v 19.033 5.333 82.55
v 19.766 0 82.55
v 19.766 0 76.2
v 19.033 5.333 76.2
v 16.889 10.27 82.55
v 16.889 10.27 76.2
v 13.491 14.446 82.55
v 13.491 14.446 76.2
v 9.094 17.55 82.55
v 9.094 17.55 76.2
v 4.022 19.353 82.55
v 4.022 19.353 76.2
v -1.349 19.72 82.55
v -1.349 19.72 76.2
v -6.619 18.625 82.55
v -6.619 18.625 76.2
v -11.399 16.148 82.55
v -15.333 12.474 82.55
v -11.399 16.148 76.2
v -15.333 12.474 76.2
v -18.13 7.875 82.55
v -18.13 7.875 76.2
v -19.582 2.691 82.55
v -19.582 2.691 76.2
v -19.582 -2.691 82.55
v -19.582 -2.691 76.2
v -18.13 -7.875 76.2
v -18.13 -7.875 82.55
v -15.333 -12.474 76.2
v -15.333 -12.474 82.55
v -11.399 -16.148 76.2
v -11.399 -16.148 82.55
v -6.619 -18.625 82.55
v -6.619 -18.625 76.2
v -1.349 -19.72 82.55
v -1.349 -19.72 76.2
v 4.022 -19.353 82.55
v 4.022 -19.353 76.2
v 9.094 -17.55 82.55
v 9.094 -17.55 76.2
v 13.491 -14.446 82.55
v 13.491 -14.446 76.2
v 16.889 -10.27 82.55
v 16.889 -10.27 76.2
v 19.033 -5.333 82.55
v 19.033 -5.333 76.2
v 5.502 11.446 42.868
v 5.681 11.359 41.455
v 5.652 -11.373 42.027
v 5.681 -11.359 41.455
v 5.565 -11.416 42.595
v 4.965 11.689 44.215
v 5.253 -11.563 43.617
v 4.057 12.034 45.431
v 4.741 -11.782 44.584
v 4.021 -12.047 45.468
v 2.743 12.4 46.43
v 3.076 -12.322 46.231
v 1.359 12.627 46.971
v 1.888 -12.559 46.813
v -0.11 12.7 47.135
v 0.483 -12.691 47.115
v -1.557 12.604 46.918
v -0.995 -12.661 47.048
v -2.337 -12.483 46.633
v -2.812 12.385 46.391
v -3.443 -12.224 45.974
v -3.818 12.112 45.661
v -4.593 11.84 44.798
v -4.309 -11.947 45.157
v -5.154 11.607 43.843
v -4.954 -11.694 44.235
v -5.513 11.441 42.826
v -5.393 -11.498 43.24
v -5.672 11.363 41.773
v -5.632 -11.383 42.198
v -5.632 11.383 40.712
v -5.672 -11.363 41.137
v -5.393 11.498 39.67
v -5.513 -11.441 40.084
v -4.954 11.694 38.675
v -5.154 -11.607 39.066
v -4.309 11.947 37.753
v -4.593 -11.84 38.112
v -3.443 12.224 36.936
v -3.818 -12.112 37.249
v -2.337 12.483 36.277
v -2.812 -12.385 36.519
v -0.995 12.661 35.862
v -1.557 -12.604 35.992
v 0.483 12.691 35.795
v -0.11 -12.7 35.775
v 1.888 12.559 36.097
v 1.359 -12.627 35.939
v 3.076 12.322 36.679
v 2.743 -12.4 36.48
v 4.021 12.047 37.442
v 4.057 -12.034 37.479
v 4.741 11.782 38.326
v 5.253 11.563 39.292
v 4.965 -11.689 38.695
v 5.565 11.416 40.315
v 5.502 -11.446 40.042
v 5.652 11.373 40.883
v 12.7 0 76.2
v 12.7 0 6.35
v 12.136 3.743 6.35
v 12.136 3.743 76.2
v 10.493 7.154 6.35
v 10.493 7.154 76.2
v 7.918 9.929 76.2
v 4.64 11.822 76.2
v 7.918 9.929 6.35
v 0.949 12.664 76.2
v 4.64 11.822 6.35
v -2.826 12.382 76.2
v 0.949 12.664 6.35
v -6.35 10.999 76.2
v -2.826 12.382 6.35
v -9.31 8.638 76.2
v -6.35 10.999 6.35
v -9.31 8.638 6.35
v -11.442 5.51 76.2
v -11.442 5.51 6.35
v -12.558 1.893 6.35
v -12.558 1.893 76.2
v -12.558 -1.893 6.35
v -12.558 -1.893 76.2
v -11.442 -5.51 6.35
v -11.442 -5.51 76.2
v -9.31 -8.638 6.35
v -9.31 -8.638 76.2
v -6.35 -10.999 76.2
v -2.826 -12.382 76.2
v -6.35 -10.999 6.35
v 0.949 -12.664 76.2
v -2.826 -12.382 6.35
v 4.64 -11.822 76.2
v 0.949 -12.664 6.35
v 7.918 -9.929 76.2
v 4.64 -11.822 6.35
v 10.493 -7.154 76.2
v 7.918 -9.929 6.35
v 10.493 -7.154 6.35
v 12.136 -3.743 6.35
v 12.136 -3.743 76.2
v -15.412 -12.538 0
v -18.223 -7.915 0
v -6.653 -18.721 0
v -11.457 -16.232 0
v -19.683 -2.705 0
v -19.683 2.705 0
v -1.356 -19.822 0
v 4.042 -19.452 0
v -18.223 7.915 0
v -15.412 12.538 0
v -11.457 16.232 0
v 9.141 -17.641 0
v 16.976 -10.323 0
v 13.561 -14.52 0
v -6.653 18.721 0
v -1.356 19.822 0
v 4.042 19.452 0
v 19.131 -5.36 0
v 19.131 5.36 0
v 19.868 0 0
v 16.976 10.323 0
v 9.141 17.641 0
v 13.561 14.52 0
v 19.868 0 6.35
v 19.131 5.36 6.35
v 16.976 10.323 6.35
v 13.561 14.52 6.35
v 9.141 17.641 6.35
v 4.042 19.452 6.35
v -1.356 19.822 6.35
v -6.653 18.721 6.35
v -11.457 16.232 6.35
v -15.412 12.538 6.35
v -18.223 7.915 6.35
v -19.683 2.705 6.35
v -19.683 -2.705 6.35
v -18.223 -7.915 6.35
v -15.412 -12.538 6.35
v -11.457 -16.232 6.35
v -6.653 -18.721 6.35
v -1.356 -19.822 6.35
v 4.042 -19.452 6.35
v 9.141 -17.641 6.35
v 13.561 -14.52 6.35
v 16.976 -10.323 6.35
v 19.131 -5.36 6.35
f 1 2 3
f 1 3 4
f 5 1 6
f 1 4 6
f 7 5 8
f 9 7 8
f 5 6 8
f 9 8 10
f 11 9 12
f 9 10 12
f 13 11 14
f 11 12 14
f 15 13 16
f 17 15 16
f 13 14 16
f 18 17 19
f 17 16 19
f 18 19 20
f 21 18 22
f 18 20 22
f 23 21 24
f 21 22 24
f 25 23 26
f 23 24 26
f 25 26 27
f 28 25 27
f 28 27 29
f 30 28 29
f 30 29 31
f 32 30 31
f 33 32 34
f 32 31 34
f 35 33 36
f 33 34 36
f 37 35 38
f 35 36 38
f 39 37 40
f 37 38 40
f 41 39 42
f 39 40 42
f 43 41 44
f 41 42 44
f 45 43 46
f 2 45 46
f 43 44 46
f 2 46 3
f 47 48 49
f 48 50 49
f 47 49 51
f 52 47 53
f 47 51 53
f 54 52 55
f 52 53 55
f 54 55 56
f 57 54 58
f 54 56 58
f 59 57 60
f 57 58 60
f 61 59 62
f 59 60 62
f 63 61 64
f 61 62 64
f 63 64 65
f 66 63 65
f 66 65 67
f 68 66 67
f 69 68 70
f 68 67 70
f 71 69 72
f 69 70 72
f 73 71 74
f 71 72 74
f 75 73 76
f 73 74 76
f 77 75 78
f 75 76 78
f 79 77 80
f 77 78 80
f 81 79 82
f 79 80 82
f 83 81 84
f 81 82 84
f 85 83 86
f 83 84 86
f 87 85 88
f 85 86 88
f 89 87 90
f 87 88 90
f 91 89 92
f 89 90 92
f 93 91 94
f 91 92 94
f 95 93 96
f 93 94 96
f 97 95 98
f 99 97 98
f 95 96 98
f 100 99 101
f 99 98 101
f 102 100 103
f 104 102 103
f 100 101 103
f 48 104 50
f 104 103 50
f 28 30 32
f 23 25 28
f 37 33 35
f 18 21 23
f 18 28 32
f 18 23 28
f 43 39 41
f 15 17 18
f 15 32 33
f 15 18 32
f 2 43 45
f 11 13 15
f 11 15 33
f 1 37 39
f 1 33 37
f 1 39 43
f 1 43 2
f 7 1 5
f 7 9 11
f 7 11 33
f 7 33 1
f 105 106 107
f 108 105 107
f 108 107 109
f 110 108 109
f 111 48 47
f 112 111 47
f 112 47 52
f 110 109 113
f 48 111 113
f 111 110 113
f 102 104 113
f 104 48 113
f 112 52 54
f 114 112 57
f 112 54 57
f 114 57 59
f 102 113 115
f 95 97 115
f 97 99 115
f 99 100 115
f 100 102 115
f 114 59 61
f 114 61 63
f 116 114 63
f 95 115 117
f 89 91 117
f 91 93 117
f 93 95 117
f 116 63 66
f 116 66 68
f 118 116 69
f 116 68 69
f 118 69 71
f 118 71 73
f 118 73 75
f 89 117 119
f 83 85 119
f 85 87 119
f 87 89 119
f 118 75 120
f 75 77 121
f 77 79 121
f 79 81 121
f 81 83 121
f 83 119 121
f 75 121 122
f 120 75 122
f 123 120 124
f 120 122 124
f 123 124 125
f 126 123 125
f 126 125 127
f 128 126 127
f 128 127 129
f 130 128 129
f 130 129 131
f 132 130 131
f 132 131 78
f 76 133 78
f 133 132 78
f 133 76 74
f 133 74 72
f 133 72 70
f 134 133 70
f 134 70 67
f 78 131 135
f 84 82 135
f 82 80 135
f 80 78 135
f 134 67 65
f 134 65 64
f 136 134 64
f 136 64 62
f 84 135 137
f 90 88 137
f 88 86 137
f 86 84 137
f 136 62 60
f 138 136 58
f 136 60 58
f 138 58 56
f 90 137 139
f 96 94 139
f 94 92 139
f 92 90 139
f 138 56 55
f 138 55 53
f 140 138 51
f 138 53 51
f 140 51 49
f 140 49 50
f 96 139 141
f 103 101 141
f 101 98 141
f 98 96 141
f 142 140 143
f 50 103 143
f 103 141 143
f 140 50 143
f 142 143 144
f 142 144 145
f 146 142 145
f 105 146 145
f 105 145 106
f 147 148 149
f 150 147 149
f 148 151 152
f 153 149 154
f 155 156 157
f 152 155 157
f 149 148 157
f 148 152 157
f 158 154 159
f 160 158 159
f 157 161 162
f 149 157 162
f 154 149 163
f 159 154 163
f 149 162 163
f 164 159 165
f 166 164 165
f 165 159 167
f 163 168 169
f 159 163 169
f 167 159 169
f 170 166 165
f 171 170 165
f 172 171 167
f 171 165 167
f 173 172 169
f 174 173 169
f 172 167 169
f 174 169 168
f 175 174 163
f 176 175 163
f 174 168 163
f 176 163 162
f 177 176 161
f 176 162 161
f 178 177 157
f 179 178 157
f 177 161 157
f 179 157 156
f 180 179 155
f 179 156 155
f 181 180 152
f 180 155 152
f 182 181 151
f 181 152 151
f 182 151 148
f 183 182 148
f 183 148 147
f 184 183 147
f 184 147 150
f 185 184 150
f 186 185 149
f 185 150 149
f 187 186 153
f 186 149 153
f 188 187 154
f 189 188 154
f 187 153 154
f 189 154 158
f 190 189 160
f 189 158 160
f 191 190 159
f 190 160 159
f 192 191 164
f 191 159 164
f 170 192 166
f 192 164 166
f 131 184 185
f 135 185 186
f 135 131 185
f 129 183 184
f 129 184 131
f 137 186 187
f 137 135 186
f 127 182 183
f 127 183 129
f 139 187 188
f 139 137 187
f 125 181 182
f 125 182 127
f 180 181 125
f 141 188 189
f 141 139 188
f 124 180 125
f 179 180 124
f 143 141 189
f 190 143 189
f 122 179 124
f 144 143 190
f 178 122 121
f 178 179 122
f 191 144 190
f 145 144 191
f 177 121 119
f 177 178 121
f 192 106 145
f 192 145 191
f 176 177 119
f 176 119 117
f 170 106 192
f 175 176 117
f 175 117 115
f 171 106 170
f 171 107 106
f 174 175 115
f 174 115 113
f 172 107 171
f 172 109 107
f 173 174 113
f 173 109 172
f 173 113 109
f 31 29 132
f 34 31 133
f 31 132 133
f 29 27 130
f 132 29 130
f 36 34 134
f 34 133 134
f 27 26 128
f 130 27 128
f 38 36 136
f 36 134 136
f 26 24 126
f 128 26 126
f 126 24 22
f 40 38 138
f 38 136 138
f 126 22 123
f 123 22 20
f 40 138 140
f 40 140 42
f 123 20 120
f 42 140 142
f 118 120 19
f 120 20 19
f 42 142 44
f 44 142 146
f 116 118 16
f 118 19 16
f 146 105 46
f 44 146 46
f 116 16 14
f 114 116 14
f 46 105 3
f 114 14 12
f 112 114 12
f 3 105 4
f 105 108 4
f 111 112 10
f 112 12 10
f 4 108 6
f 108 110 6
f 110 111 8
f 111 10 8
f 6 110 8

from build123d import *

# Parameters (mm, degrees)
F0_R      = 12.7
F1_DEPTH  = 76.2
F2_R      = 19.868023
F3_DEPTH  = 6.35
F4_R      = 19.76611
F5_DEPTH  = 6.35
F6_R      = 5.68078
F7_DEPTH  = 508
F7_FACE_R = 5.68078
F8_DEPTH  = 1270


with BuildPart() as f1:
    # F0 (on Top) → F1 (new body)
    with BuildSketch(Plane.XY):
        Circle(F0_R)
    extrude(amount=F1_DEPTH)

    # F2 (on Top) → F3 (join)
    with BuildSketch(Plane.XY):
        Circle(F2_R)
    extrude(amount=F3_DEPTH)

    # F4 (on face) → F5 (join)
    with BuildSketch(Plane.XY.offset(76.2)):
        Circle(F4_R)
    extrude(amount=F5_DEPTH)

    # F6 (on Front) → F7 (cut)
    with BuildSketch(Plane.XZ):
        with Locations((0, 41.454975)):
            Circle(F6_R)
    extrude(amount=-F7_DEPTH, mode=Mode.SUBTRACT)

    # F7_face (on face) → F8 (cut)
    with BuildSketch(Plane(origin=(0, 0, 41.454975), x_dir=(1, 0, 0), z_dir=(0, 1, 0))):
        Circle(F7_FACE_R)
    extrude(amount=-F8_DEPTH, mode=Mode.SUBTRACT)


solid = f1.part
